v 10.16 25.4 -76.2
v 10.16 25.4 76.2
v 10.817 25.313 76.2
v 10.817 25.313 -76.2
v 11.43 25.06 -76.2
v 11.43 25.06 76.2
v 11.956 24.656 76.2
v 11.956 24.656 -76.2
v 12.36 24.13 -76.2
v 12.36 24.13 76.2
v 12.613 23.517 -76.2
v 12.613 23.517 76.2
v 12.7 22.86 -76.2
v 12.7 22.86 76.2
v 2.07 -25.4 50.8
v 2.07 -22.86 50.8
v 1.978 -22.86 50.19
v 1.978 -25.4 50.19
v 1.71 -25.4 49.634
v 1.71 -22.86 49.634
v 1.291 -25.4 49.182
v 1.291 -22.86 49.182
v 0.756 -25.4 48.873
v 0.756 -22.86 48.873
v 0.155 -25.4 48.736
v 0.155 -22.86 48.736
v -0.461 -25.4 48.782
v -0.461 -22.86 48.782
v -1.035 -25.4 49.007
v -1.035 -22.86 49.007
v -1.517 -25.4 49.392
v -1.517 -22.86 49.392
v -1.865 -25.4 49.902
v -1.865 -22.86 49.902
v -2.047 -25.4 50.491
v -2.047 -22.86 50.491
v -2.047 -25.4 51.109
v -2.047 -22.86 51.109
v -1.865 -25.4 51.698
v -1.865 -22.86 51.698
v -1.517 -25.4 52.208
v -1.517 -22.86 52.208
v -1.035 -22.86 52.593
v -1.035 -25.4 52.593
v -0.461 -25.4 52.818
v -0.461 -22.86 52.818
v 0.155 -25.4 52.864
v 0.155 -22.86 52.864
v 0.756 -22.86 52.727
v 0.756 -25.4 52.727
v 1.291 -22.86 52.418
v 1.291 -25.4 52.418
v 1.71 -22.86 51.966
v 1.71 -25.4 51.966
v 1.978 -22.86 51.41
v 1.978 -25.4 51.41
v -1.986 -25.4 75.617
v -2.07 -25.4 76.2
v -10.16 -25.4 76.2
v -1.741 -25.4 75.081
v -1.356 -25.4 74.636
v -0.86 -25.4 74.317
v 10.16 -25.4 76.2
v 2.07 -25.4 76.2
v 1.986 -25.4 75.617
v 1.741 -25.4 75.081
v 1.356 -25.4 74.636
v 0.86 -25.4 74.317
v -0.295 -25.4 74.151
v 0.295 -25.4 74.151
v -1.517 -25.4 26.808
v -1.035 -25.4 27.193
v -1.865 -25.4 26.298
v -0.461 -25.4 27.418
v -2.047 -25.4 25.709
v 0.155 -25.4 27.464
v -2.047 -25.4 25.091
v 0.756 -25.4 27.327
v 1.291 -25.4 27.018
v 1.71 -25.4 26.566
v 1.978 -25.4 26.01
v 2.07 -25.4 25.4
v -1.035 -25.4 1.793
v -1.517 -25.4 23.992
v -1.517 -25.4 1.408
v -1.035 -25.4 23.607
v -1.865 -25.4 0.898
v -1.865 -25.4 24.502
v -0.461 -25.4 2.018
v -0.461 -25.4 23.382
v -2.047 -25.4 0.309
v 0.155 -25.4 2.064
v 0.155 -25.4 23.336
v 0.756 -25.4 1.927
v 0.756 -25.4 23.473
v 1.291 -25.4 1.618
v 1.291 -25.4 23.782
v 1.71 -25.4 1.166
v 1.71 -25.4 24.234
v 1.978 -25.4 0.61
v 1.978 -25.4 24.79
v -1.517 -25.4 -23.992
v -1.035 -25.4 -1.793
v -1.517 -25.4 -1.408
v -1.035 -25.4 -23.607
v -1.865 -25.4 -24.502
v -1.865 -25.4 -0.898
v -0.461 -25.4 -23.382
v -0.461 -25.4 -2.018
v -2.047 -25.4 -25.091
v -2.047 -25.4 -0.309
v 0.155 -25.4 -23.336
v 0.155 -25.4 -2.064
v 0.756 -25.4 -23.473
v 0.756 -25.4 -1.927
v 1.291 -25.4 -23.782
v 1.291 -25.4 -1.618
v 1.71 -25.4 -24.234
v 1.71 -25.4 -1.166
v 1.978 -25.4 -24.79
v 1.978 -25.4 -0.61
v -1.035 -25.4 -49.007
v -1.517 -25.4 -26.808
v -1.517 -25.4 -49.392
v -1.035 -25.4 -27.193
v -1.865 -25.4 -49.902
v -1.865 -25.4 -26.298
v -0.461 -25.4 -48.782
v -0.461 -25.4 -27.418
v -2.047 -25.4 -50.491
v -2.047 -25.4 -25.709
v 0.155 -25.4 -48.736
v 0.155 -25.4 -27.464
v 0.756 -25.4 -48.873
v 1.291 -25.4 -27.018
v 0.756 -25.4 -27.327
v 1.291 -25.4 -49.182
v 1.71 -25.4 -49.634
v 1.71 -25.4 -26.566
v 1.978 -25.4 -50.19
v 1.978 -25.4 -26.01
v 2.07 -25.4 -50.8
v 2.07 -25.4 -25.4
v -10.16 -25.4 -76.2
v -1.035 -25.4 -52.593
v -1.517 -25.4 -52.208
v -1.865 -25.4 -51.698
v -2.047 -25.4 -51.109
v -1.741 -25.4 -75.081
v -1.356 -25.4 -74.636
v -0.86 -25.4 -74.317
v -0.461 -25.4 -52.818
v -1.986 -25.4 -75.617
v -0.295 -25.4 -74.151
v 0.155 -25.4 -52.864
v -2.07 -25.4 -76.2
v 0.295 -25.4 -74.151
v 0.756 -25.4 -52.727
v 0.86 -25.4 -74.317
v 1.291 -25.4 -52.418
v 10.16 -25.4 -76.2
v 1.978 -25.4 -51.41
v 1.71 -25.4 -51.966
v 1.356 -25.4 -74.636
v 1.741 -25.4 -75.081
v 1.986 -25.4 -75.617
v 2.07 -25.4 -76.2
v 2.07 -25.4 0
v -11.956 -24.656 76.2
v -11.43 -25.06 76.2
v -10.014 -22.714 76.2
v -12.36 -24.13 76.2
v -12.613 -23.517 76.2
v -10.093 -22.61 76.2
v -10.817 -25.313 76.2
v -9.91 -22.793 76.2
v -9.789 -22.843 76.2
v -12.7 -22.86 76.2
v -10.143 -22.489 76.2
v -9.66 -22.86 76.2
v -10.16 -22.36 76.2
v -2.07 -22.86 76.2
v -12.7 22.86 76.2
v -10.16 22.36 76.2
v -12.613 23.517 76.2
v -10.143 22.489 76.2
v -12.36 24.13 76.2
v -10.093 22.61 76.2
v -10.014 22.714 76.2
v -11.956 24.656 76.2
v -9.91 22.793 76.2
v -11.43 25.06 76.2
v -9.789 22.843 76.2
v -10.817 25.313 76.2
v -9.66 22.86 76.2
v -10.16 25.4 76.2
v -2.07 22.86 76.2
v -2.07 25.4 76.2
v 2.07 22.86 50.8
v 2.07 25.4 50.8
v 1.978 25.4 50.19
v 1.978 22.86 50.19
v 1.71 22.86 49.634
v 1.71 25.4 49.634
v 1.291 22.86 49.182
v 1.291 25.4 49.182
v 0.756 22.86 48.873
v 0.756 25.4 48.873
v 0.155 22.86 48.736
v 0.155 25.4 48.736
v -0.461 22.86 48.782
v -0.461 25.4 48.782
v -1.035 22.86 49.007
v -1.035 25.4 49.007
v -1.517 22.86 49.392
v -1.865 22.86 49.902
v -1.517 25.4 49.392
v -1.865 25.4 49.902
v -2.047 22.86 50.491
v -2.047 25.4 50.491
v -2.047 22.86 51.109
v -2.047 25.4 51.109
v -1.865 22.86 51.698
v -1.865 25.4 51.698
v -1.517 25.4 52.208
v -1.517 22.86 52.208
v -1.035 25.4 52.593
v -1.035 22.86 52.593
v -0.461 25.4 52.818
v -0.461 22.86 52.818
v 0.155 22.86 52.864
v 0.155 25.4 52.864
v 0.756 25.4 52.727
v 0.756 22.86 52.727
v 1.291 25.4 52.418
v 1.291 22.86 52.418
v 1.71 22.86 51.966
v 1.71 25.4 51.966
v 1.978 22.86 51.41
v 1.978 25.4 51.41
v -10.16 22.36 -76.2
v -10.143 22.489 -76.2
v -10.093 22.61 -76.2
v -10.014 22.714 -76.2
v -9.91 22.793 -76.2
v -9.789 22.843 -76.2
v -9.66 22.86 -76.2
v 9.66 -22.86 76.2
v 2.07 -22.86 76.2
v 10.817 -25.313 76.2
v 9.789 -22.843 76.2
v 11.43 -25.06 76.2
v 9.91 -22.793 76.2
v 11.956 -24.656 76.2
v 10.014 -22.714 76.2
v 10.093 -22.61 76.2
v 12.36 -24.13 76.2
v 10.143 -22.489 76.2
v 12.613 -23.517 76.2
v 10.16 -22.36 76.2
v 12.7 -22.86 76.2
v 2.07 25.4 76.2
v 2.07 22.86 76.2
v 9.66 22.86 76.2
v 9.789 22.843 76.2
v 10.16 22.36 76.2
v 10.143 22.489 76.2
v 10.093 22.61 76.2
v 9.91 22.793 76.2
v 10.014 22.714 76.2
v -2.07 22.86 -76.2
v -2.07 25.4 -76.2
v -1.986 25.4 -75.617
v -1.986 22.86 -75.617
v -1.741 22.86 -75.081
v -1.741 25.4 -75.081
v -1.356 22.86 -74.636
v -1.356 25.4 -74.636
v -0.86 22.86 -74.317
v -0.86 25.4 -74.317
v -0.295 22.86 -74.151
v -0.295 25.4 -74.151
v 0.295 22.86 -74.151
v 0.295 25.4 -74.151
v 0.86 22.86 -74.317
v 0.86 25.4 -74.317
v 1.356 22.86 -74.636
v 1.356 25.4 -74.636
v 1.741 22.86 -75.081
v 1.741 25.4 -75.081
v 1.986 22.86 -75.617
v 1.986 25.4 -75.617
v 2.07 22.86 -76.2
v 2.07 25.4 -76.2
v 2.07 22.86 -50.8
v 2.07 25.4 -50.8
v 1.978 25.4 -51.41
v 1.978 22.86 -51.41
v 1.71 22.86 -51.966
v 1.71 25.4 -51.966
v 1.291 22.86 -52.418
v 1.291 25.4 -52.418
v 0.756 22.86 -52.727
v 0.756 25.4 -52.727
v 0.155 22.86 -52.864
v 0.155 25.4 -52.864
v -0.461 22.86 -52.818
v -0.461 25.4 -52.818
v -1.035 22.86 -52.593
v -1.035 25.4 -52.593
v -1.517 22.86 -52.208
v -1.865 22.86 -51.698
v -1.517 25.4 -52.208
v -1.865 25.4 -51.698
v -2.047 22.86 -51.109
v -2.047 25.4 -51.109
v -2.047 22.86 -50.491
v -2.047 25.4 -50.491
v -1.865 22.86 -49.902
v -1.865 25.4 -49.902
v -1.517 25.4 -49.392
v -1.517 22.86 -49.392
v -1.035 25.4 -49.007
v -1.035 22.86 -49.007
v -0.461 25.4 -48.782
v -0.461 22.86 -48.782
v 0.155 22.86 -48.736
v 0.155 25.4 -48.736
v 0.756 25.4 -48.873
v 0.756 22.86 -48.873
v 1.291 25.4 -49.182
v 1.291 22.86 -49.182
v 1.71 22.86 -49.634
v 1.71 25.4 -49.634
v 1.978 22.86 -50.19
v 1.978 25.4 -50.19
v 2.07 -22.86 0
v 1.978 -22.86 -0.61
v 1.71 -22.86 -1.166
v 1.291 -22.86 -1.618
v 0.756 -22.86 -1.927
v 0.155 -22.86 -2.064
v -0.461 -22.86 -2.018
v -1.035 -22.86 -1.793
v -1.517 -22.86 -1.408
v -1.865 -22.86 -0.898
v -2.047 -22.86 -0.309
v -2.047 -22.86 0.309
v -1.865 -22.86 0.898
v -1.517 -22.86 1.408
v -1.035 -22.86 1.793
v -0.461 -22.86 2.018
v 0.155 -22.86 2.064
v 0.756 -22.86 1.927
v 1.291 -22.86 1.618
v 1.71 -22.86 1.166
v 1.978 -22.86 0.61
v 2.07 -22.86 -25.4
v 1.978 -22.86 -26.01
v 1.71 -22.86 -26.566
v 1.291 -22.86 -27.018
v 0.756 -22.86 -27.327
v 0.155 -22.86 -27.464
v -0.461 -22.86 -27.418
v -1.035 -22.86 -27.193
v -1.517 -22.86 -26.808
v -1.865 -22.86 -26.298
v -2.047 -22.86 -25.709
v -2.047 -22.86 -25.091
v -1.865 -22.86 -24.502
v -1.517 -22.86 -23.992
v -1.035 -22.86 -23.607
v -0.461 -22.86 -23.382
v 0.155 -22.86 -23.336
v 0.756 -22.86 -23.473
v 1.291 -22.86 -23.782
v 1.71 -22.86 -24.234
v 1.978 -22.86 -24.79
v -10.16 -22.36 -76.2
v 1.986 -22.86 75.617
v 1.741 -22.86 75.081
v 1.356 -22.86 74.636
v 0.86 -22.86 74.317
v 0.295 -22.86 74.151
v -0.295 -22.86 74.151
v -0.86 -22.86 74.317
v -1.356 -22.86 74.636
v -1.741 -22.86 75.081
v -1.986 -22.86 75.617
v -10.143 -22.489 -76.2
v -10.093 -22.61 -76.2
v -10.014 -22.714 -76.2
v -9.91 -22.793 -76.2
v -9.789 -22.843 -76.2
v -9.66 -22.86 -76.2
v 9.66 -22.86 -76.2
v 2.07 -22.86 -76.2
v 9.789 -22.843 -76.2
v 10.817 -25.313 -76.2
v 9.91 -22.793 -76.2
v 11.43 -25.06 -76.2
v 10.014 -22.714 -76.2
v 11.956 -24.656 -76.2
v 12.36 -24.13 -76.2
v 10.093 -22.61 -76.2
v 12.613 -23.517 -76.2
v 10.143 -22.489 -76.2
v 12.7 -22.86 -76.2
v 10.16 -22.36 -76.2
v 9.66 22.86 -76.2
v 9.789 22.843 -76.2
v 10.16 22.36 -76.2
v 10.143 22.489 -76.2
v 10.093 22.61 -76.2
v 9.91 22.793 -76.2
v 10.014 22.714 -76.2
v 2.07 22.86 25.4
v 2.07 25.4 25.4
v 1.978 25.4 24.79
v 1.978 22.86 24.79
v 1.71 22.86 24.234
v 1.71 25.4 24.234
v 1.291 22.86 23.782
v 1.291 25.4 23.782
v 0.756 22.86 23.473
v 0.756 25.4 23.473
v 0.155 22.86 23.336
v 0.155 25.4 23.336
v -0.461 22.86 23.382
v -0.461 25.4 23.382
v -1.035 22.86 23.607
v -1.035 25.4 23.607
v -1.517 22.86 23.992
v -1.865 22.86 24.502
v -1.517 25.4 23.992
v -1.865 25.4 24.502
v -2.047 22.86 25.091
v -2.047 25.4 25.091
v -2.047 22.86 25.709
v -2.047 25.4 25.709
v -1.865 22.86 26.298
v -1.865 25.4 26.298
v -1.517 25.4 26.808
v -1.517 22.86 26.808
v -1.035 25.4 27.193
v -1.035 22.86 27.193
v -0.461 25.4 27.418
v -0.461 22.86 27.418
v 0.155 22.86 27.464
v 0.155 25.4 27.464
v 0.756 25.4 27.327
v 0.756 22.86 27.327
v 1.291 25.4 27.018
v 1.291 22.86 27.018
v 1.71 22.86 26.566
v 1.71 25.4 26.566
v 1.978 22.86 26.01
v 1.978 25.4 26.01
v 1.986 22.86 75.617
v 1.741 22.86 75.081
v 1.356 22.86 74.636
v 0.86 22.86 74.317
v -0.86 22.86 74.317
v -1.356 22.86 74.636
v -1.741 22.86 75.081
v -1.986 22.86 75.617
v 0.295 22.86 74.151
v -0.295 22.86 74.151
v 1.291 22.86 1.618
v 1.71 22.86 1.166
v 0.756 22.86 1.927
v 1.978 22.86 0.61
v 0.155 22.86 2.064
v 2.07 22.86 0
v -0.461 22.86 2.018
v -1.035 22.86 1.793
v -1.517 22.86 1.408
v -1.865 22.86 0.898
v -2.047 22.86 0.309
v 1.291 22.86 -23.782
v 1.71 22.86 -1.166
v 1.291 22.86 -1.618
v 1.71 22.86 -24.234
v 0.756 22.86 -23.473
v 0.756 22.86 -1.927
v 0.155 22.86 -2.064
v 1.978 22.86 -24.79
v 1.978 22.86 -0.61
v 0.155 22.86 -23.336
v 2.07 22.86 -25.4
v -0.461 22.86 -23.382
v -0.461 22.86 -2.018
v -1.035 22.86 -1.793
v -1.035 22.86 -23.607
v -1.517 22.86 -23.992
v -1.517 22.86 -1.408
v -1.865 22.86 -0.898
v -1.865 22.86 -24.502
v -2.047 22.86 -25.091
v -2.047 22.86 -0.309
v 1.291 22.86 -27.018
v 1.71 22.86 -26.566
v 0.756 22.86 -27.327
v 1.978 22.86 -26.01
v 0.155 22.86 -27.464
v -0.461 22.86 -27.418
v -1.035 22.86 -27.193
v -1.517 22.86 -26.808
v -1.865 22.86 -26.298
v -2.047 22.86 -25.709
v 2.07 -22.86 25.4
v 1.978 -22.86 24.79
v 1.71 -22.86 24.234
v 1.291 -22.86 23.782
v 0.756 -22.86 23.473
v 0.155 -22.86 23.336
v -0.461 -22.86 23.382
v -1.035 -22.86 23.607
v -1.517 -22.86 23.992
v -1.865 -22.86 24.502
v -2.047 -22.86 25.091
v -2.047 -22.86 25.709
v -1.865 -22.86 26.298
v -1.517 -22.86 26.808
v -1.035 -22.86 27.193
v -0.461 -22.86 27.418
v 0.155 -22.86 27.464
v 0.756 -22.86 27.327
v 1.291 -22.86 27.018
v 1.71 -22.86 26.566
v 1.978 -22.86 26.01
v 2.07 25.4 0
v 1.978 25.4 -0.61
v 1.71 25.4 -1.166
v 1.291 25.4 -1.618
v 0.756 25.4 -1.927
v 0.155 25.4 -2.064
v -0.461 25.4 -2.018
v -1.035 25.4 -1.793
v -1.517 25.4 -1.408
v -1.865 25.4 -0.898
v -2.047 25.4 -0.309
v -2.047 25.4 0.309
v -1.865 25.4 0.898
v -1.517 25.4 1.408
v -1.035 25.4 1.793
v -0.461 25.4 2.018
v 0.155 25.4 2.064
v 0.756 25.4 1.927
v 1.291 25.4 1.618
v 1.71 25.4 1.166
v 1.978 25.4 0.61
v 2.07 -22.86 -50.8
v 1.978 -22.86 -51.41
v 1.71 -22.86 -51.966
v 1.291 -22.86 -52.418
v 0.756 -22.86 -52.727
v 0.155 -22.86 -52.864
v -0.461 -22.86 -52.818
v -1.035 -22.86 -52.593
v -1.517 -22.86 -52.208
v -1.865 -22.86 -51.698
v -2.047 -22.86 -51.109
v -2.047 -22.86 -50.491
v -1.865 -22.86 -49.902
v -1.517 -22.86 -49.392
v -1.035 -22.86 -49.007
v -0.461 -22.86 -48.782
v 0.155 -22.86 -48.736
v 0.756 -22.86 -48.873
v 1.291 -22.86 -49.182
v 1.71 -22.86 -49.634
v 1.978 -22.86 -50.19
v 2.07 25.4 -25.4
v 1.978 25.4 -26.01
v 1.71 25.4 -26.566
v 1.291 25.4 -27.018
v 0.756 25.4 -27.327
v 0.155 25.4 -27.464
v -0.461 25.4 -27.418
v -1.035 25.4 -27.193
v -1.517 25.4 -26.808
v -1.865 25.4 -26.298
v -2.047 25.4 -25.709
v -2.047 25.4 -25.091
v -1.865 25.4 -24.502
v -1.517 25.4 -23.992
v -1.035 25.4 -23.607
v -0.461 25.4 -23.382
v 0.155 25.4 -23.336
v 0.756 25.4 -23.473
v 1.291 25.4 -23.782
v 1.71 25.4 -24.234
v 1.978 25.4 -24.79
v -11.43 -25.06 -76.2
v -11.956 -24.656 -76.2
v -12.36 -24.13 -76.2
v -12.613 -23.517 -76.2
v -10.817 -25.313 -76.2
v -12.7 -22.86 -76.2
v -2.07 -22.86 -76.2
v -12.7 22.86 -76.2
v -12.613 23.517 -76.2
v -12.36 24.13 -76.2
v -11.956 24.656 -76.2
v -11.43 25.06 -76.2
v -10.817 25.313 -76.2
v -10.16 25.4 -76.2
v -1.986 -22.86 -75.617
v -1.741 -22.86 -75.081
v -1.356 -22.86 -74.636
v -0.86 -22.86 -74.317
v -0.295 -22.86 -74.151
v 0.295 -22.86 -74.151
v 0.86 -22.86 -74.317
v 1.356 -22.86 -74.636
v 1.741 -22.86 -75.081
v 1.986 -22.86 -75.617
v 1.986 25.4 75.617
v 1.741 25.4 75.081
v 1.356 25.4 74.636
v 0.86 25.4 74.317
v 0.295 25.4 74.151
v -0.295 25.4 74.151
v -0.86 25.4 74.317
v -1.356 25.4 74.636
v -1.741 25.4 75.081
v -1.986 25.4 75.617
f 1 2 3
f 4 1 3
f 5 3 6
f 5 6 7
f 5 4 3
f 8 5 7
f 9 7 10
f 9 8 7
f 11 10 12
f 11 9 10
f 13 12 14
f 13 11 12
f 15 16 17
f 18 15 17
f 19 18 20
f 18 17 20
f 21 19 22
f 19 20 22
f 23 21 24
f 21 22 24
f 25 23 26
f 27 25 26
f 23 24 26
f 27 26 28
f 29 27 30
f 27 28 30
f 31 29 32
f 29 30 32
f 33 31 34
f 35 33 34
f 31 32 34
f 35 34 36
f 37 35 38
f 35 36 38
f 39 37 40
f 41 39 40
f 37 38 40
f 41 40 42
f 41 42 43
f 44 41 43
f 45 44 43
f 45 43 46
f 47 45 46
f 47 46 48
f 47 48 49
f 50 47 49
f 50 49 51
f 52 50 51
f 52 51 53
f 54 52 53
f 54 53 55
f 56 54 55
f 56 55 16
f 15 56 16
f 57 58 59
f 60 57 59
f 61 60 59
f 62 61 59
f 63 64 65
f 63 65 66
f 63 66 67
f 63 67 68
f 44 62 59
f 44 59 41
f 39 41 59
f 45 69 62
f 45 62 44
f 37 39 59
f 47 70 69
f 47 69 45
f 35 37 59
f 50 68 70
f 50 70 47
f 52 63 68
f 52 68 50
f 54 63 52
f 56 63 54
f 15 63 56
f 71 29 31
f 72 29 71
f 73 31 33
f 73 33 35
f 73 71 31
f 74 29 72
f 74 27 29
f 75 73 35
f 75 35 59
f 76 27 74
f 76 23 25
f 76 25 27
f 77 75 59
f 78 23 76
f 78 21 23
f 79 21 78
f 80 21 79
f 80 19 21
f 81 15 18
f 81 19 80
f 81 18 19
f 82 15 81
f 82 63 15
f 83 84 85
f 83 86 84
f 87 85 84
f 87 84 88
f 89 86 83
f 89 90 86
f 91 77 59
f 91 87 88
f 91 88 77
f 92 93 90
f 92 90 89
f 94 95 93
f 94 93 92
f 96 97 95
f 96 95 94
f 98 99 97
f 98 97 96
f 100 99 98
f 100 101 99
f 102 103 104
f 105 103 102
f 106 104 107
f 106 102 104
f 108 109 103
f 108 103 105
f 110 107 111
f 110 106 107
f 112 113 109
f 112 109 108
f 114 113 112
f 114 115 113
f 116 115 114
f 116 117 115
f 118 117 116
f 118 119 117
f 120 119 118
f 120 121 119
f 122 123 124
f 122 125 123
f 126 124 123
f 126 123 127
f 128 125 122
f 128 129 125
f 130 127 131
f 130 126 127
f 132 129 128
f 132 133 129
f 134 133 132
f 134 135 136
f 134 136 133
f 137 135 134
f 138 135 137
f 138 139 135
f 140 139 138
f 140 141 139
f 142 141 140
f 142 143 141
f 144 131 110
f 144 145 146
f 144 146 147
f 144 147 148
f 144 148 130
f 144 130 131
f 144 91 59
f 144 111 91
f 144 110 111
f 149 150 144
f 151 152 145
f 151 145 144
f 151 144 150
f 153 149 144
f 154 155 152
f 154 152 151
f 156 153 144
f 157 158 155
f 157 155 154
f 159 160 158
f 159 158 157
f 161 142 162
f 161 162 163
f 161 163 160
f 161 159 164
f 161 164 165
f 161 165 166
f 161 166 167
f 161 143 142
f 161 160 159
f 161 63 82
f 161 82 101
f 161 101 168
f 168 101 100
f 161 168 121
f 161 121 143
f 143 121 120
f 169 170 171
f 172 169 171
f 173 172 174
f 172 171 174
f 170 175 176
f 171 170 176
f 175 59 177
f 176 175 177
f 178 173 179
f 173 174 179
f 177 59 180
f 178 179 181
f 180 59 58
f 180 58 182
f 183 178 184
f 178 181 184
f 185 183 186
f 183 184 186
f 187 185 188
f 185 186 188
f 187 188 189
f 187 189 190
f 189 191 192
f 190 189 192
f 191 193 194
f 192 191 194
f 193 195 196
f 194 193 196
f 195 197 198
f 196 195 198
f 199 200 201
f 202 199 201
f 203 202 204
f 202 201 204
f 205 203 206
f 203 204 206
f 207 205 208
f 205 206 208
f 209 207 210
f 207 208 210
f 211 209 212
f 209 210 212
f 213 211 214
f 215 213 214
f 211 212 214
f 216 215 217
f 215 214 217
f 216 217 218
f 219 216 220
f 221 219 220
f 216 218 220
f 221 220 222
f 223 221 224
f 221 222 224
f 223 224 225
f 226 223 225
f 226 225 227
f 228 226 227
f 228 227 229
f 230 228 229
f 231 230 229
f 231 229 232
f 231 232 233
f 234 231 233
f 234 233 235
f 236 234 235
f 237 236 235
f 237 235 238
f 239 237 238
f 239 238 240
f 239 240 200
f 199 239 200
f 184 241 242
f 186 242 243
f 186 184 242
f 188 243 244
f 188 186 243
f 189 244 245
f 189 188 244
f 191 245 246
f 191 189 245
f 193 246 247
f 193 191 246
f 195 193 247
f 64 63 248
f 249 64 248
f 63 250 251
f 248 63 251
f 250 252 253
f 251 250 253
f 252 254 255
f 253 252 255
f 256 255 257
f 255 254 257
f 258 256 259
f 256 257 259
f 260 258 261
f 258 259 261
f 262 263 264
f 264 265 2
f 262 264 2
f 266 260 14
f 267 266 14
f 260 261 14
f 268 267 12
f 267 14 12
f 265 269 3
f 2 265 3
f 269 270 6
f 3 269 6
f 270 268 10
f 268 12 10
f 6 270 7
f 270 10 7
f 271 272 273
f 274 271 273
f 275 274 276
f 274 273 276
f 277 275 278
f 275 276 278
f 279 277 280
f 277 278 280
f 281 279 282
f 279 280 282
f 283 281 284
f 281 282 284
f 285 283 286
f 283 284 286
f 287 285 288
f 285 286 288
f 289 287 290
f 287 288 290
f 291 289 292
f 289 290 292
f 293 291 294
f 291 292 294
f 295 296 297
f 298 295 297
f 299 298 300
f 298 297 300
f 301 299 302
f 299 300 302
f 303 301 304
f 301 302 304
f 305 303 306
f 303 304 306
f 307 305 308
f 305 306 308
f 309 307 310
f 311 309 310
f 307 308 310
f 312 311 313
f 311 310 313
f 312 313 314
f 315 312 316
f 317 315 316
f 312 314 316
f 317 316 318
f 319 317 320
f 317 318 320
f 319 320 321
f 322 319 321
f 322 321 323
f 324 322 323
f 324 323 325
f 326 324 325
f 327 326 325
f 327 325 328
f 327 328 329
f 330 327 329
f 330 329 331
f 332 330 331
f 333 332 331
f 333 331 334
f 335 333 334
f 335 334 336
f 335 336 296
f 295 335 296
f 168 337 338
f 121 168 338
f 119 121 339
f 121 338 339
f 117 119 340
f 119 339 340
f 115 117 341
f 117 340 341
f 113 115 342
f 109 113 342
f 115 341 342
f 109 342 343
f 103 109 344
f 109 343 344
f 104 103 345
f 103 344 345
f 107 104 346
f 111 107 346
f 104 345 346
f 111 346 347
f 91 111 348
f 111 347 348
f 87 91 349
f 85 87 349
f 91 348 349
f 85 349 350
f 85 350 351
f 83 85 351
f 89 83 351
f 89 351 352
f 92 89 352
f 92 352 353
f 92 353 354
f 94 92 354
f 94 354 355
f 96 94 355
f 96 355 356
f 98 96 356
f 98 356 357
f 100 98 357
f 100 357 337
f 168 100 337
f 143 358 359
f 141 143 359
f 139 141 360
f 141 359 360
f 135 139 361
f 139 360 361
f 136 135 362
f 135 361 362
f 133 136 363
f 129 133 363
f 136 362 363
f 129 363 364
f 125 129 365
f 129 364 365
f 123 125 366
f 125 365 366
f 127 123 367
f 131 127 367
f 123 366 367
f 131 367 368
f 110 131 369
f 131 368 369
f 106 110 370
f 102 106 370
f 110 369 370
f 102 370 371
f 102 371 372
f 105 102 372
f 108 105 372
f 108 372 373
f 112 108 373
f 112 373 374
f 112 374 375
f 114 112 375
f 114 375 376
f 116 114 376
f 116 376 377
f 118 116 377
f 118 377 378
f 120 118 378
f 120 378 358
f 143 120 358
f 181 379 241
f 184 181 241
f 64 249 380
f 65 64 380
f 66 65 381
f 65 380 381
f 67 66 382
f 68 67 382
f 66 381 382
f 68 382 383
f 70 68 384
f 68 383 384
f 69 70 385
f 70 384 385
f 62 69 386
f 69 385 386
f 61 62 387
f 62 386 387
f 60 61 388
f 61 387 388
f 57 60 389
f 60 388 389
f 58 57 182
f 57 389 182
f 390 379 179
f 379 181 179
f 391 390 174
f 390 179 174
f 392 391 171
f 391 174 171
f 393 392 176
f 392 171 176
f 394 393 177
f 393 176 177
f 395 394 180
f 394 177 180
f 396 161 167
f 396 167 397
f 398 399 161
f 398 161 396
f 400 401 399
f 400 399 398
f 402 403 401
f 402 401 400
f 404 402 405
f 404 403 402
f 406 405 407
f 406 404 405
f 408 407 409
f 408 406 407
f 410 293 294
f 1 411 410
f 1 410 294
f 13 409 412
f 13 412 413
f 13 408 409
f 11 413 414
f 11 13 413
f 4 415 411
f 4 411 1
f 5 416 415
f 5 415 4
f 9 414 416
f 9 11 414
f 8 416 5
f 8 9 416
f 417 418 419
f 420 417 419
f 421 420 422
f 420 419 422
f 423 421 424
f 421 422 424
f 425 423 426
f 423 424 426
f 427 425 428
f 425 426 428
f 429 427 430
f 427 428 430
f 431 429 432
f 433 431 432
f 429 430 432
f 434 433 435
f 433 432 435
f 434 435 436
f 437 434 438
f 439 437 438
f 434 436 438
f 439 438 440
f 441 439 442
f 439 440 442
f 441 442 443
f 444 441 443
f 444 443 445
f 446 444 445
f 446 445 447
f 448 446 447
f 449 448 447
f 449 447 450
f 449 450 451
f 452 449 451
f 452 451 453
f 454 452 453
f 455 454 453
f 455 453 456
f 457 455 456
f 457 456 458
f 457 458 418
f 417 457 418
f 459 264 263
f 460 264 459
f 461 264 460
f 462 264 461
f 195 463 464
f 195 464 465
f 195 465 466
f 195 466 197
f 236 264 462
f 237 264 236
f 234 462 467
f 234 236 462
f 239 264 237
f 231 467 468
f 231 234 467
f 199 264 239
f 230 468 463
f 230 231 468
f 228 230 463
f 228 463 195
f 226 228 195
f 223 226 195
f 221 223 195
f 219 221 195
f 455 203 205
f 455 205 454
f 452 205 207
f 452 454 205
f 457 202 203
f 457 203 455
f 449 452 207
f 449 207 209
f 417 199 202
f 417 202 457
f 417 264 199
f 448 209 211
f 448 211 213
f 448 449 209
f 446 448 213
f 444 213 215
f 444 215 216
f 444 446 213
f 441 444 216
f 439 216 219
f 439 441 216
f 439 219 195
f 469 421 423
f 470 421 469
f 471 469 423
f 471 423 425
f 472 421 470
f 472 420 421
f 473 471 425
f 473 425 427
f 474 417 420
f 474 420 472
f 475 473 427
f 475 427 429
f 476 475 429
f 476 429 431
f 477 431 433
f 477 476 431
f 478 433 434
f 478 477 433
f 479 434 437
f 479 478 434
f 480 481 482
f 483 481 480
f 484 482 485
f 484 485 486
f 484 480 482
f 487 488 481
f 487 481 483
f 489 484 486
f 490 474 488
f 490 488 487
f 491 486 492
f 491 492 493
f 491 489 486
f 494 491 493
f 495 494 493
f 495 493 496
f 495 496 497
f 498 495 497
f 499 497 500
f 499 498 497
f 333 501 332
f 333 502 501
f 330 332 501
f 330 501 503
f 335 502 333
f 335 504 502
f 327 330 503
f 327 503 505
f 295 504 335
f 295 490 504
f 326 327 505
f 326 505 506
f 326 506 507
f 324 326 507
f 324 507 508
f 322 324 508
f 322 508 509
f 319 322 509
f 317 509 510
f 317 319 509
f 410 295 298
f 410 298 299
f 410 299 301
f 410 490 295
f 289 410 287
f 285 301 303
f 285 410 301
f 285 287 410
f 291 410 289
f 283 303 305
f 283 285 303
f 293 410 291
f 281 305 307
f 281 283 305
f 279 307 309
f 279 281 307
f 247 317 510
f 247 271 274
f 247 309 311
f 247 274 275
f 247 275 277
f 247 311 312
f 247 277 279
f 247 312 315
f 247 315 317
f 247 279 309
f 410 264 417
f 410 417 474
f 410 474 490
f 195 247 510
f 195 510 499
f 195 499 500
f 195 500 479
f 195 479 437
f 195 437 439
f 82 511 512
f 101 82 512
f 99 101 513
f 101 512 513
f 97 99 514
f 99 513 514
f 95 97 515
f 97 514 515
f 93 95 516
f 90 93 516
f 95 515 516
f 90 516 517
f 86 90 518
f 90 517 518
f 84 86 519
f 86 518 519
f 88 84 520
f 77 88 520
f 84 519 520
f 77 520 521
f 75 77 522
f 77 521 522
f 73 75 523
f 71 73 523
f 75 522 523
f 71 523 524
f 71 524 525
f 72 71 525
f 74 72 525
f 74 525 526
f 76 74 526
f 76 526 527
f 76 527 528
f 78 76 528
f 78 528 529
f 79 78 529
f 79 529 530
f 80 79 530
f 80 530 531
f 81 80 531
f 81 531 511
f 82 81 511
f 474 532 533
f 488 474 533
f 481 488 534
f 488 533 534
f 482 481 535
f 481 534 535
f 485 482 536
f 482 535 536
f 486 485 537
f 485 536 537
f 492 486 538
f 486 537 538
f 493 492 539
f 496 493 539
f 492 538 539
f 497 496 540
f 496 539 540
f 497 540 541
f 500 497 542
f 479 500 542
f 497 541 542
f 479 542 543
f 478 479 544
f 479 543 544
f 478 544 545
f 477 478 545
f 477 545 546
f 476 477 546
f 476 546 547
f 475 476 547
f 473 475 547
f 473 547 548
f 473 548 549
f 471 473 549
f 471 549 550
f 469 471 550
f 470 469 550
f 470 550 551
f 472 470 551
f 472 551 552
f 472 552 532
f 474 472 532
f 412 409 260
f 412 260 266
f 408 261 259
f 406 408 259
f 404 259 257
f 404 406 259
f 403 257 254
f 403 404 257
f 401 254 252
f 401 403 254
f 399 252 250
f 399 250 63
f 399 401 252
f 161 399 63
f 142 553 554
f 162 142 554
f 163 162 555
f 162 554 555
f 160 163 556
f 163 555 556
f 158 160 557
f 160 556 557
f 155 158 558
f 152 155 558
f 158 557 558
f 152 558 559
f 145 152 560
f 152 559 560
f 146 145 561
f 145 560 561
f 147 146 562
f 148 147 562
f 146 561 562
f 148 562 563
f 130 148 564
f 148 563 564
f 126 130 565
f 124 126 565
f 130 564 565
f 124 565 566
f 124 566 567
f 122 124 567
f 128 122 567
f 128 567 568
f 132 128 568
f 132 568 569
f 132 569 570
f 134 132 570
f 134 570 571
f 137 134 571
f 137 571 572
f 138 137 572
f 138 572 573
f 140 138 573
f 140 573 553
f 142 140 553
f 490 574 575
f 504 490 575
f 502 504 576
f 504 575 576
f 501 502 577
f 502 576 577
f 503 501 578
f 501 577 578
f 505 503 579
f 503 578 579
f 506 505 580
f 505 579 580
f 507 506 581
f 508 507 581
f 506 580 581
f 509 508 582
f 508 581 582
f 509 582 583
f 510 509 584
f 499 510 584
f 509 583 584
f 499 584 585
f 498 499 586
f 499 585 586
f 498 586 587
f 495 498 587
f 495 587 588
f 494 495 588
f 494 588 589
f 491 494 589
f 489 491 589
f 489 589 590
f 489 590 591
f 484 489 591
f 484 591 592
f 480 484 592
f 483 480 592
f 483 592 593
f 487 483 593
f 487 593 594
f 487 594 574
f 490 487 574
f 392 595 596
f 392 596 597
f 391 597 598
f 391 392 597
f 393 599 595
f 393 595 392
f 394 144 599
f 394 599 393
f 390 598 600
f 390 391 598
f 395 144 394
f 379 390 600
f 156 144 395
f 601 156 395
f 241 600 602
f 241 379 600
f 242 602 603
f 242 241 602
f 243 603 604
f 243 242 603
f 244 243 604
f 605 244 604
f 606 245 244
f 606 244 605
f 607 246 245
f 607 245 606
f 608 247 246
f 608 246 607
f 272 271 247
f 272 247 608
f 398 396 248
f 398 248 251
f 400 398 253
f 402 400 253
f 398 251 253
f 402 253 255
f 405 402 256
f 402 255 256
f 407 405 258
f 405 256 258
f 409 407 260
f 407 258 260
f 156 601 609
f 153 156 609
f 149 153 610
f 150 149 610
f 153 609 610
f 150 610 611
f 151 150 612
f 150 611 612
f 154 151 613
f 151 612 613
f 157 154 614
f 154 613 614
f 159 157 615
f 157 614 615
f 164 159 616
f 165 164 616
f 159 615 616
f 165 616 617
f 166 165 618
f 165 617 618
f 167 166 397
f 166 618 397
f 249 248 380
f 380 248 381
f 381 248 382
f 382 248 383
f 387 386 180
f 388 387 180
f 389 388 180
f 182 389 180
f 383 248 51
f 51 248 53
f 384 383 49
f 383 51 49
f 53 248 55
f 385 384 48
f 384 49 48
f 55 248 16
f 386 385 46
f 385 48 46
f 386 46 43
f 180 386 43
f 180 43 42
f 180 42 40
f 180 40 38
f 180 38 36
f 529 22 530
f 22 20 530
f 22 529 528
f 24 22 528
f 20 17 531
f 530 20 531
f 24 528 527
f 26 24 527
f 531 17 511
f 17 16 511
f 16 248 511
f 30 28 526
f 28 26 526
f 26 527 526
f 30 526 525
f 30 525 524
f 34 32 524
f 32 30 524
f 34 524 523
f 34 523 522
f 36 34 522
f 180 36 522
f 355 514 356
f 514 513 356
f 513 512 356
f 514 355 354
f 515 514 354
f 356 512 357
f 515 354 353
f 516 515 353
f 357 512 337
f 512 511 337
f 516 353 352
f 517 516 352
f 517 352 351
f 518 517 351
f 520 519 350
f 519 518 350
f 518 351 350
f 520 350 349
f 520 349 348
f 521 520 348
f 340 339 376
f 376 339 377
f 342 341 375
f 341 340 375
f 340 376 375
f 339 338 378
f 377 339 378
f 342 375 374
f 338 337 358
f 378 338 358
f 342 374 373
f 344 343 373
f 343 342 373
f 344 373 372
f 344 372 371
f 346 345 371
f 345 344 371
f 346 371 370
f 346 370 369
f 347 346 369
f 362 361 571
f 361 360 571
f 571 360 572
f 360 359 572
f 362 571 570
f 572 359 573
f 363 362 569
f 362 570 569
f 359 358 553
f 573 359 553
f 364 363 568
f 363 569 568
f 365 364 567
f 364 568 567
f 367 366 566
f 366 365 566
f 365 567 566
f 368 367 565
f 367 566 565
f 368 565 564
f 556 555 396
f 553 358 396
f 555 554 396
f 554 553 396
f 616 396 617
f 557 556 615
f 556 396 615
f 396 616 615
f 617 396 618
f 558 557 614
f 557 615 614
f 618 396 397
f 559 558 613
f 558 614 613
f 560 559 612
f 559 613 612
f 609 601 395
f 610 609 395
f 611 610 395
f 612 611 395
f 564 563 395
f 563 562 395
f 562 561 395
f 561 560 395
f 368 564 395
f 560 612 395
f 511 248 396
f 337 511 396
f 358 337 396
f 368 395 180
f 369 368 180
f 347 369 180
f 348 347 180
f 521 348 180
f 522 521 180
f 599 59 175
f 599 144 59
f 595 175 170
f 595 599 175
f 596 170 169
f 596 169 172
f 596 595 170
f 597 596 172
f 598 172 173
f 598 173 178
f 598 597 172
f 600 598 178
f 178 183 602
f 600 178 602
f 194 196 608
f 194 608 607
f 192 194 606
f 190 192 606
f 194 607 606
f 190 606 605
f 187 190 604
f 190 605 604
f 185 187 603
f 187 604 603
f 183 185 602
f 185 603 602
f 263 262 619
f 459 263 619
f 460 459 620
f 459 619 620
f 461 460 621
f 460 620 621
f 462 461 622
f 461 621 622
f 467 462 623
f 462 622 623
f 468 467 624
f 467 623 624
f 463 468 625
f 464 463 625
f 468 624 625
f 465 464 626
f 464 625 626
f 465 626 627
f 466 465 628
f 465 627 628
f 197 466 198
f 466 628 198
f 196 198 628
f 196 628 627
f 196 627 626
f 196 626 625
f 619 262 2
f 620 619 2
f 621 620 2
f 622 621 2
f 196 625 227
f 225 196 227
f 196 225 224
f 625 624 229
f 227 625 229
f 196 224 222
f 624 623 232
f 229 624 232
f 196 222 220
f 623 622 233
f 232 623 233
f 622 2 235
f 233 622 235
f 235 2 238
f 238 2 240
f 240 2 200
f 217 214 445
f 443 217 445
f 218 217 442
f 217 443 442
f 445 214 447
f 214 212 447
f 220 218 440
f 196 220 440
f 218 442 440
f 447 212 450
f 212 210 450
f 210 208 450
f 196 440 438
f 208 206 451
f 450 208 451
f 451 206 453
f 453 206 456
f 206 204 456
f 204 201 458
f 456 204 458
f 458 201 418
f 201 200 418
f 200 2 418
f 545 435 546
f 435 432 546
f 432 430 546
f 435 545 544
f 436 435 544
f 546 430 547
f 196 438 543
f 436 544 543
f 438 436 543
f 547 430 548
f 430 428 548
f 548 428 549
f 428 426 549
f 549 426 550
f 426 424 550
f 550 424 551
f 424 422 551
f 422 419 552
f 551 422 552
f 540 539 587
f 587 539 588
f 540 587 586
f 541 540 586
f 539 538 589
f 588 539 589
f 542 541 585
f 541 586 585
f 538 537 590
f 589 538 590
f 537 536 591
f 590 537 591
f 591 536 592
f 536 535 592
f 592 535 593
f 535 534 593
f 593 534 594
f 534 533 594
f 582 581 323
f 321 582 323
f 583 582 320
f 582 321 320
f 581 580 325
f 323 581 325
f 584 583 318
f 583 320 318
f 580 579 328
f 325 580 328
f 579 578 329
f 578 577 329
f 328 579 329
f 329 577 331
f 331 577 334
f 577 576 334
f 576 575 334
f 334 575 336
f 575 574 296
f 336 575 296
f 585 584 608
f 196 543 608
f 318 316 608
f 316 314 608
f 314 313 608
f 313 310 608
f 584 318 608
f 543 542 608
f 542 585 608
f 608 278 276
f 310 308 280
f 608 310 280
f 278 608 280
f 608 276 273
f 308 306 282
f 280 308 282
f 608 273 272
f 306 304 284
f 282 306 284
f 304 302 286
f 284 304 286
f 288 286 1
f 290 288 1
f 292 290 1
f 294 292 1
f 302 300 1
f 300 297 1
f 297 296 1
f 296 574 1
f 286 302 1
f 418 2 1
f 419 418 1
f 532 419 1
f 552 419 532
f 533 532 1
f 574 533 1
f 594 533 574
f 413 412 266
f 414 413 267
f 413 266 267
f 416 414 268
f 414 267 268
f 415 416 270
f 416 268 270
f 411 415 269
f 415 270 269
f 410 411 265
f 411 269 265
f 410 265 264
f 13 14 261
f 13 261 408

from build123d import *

# Parameters (mm, degrees)
SKETCH1_W                 = 152.4
SKETCH1_H                 = 50.8
BOSS_EXTRUDE1_DEPTH       = 25.4
SKETCH2_W                 = 20.32
SKETCH2_H                 = 45.72
CUT_EXTRUDE1_DEPTH        = 153.4
F_6_CLEARANCE_HOLE1_D     = 4.1402
F_6_CLEARANCE_HOLE1_DEPTH = 50.8
F_6_CLEARANCE_HOLE2_D     = 4.1402
F_6_CLEARANCE_HOLE2_DEPTH = 50.8
FILLET1_R                 = 0.5
FILLET2_R                 = 2.54


with BuildPart() as part:
    # Sketch1 → Boss-Extrude1 (new body)
    with BuildSketch(Plane(origin=(12.7, 0, 0), x_dir=(0, 0, -1), z_dir=(1, 0, 0))):
        Rectangle(SKETCH1_W, SKETCH1_H)
    extrude(amount=-BOSS_EXTRUDE1_DEPTH)

    # Sketch2 → Cut-Extrude1 (cut, through all)
    with BuildSketch(Plane(origin=(0, 0, -76.2), x_dir=(-1, 0, 0), z_dir=(0, 0, -1))):
        Rectangle(SKETCH2_W, SKETCH2_H)
    extrude(amount=-CUT_EXTRUDE1_DEPTH, mode=Mode.SUBTRACT)

    # #6 Clearance Hole1
    with Locations(Plane(origin=(0, -25.4, 0), x_dir=(-1, 0, 0), z_dir=(0, -1, 0))):
        with Locations((0, 711.2), (0, 736.6), (0, 685.8), (0, 660.4), (0, 635), (0, 609.6), (0, 584.2), (0, 558.8), (0, 533.4), (0, 508), (0, 482.6), (0, 457.2), (0, 431.8), (0, 406.4), (0, 381), (0, 355.6), (0, 330.2), (0, 304.8), (0, 279.4), (0, 254), (0, 228.6), (0, 203.2), (0, 177.8), (0, 152.4), (0, 127), (0, 101.6), (0, 76.2), (0, 50.8), (0, 25.4), (0, 0), (0, -25.4), (0, -50.8), (0, -76.2), (0, -101.6), (0, -127), (0, -152.4), (0, -177.8), (0, -203.2), (0, -228.6), (0, -254), (0, -279.4), (0, -304.8), (0, -330.2), (0, -355.6), (0, -381), (0, -406.4), (0, -431.8), (0, -457.2), (0, -482.6), (0, -508), (0, -533.4), (0, -558.8), (0, -584.2), (0, -609.6), (0, -635), (0, -660.4), (0, -685.8), (0, -711.2), (0, -736.6)):
            Hole(F_6_CLEARANCE_HOLE1_D / 2, depth=F_6_CLEARANCE_HOLE1_DEPTH)

    # #6 Clearance Hole2
    with Locations(Plane(origin=(0, 25.4, 0), x_dir=(1, 0, 0), z_dir=(0, 1, 0))):
        with Locations((0, 711.2), (0, 736.6), (0, 685.8), (0, 660.4), (0, 635), (0, 609.6), (0, 584.2), (0, 558.8), (0, 533.4), (0, 508), (0, 482.6), (0, 457.2), (0, 431.8), (0, 406.4), (0, 381), (0, 355.6), (0, 330.2), (0, 304.8), (0, 279.4), (0, 254), (0, 228.6), (0, 203.2), (0, 177.8), (0, 152.4), (0, 127), (0, 101.6), (0, 76.2), (0, 50.8), (0, 25.4), (0, 0), (0, -25.4), (0, -50.8), (0, -76.2), (0, -101.6), (0, -127), (0, -152.4), (0, -177.8), (0, -203.2), (0, -228.6), (0, -254), (0, -279.4), (0, -304.8), (0, -330.2), (0, -355.6), (0, -381), (0, -406.4), (0, -431.8), (0, -457.2), (0, -482.6), (0, -508), (0, -533.4), (0, -558.8), (0, -584.2), (0, -609.6), (0, -635), (0, -660.4), (0, -685.8), (0, -711.2), (0, -736.6)):
            Hole(F_6_CLEARANCE_HOLE2_D / 2, depth=F_6_CLEARANCE_HOLE2_DEPTH)

    # Fillet1
    fillet1_edges = [part.edges().sort_by_distance(p)[0] for p in [
        (-10.16, -22.86, 0),
        (10.16, -22.86, 0),
        (10.16, 22.86, 0),
        (-10.16, 22.86, 0),
    ]]
    fillet(fillet1_edges, radius=FILLET1_R)

    # Fillet2
    fillet2_edges = [part.edges().sort_by_distance(p)[0] for p in [
        (-12.7, 25.4, 0),
        (-12.7, -25.4, 0),
        (12.7, 25.4, 0),
        (12.7, -25.4, 0),
    ]]
    fillet(fillet2_edges, radius=FILLET2_R)


solid = part.part
